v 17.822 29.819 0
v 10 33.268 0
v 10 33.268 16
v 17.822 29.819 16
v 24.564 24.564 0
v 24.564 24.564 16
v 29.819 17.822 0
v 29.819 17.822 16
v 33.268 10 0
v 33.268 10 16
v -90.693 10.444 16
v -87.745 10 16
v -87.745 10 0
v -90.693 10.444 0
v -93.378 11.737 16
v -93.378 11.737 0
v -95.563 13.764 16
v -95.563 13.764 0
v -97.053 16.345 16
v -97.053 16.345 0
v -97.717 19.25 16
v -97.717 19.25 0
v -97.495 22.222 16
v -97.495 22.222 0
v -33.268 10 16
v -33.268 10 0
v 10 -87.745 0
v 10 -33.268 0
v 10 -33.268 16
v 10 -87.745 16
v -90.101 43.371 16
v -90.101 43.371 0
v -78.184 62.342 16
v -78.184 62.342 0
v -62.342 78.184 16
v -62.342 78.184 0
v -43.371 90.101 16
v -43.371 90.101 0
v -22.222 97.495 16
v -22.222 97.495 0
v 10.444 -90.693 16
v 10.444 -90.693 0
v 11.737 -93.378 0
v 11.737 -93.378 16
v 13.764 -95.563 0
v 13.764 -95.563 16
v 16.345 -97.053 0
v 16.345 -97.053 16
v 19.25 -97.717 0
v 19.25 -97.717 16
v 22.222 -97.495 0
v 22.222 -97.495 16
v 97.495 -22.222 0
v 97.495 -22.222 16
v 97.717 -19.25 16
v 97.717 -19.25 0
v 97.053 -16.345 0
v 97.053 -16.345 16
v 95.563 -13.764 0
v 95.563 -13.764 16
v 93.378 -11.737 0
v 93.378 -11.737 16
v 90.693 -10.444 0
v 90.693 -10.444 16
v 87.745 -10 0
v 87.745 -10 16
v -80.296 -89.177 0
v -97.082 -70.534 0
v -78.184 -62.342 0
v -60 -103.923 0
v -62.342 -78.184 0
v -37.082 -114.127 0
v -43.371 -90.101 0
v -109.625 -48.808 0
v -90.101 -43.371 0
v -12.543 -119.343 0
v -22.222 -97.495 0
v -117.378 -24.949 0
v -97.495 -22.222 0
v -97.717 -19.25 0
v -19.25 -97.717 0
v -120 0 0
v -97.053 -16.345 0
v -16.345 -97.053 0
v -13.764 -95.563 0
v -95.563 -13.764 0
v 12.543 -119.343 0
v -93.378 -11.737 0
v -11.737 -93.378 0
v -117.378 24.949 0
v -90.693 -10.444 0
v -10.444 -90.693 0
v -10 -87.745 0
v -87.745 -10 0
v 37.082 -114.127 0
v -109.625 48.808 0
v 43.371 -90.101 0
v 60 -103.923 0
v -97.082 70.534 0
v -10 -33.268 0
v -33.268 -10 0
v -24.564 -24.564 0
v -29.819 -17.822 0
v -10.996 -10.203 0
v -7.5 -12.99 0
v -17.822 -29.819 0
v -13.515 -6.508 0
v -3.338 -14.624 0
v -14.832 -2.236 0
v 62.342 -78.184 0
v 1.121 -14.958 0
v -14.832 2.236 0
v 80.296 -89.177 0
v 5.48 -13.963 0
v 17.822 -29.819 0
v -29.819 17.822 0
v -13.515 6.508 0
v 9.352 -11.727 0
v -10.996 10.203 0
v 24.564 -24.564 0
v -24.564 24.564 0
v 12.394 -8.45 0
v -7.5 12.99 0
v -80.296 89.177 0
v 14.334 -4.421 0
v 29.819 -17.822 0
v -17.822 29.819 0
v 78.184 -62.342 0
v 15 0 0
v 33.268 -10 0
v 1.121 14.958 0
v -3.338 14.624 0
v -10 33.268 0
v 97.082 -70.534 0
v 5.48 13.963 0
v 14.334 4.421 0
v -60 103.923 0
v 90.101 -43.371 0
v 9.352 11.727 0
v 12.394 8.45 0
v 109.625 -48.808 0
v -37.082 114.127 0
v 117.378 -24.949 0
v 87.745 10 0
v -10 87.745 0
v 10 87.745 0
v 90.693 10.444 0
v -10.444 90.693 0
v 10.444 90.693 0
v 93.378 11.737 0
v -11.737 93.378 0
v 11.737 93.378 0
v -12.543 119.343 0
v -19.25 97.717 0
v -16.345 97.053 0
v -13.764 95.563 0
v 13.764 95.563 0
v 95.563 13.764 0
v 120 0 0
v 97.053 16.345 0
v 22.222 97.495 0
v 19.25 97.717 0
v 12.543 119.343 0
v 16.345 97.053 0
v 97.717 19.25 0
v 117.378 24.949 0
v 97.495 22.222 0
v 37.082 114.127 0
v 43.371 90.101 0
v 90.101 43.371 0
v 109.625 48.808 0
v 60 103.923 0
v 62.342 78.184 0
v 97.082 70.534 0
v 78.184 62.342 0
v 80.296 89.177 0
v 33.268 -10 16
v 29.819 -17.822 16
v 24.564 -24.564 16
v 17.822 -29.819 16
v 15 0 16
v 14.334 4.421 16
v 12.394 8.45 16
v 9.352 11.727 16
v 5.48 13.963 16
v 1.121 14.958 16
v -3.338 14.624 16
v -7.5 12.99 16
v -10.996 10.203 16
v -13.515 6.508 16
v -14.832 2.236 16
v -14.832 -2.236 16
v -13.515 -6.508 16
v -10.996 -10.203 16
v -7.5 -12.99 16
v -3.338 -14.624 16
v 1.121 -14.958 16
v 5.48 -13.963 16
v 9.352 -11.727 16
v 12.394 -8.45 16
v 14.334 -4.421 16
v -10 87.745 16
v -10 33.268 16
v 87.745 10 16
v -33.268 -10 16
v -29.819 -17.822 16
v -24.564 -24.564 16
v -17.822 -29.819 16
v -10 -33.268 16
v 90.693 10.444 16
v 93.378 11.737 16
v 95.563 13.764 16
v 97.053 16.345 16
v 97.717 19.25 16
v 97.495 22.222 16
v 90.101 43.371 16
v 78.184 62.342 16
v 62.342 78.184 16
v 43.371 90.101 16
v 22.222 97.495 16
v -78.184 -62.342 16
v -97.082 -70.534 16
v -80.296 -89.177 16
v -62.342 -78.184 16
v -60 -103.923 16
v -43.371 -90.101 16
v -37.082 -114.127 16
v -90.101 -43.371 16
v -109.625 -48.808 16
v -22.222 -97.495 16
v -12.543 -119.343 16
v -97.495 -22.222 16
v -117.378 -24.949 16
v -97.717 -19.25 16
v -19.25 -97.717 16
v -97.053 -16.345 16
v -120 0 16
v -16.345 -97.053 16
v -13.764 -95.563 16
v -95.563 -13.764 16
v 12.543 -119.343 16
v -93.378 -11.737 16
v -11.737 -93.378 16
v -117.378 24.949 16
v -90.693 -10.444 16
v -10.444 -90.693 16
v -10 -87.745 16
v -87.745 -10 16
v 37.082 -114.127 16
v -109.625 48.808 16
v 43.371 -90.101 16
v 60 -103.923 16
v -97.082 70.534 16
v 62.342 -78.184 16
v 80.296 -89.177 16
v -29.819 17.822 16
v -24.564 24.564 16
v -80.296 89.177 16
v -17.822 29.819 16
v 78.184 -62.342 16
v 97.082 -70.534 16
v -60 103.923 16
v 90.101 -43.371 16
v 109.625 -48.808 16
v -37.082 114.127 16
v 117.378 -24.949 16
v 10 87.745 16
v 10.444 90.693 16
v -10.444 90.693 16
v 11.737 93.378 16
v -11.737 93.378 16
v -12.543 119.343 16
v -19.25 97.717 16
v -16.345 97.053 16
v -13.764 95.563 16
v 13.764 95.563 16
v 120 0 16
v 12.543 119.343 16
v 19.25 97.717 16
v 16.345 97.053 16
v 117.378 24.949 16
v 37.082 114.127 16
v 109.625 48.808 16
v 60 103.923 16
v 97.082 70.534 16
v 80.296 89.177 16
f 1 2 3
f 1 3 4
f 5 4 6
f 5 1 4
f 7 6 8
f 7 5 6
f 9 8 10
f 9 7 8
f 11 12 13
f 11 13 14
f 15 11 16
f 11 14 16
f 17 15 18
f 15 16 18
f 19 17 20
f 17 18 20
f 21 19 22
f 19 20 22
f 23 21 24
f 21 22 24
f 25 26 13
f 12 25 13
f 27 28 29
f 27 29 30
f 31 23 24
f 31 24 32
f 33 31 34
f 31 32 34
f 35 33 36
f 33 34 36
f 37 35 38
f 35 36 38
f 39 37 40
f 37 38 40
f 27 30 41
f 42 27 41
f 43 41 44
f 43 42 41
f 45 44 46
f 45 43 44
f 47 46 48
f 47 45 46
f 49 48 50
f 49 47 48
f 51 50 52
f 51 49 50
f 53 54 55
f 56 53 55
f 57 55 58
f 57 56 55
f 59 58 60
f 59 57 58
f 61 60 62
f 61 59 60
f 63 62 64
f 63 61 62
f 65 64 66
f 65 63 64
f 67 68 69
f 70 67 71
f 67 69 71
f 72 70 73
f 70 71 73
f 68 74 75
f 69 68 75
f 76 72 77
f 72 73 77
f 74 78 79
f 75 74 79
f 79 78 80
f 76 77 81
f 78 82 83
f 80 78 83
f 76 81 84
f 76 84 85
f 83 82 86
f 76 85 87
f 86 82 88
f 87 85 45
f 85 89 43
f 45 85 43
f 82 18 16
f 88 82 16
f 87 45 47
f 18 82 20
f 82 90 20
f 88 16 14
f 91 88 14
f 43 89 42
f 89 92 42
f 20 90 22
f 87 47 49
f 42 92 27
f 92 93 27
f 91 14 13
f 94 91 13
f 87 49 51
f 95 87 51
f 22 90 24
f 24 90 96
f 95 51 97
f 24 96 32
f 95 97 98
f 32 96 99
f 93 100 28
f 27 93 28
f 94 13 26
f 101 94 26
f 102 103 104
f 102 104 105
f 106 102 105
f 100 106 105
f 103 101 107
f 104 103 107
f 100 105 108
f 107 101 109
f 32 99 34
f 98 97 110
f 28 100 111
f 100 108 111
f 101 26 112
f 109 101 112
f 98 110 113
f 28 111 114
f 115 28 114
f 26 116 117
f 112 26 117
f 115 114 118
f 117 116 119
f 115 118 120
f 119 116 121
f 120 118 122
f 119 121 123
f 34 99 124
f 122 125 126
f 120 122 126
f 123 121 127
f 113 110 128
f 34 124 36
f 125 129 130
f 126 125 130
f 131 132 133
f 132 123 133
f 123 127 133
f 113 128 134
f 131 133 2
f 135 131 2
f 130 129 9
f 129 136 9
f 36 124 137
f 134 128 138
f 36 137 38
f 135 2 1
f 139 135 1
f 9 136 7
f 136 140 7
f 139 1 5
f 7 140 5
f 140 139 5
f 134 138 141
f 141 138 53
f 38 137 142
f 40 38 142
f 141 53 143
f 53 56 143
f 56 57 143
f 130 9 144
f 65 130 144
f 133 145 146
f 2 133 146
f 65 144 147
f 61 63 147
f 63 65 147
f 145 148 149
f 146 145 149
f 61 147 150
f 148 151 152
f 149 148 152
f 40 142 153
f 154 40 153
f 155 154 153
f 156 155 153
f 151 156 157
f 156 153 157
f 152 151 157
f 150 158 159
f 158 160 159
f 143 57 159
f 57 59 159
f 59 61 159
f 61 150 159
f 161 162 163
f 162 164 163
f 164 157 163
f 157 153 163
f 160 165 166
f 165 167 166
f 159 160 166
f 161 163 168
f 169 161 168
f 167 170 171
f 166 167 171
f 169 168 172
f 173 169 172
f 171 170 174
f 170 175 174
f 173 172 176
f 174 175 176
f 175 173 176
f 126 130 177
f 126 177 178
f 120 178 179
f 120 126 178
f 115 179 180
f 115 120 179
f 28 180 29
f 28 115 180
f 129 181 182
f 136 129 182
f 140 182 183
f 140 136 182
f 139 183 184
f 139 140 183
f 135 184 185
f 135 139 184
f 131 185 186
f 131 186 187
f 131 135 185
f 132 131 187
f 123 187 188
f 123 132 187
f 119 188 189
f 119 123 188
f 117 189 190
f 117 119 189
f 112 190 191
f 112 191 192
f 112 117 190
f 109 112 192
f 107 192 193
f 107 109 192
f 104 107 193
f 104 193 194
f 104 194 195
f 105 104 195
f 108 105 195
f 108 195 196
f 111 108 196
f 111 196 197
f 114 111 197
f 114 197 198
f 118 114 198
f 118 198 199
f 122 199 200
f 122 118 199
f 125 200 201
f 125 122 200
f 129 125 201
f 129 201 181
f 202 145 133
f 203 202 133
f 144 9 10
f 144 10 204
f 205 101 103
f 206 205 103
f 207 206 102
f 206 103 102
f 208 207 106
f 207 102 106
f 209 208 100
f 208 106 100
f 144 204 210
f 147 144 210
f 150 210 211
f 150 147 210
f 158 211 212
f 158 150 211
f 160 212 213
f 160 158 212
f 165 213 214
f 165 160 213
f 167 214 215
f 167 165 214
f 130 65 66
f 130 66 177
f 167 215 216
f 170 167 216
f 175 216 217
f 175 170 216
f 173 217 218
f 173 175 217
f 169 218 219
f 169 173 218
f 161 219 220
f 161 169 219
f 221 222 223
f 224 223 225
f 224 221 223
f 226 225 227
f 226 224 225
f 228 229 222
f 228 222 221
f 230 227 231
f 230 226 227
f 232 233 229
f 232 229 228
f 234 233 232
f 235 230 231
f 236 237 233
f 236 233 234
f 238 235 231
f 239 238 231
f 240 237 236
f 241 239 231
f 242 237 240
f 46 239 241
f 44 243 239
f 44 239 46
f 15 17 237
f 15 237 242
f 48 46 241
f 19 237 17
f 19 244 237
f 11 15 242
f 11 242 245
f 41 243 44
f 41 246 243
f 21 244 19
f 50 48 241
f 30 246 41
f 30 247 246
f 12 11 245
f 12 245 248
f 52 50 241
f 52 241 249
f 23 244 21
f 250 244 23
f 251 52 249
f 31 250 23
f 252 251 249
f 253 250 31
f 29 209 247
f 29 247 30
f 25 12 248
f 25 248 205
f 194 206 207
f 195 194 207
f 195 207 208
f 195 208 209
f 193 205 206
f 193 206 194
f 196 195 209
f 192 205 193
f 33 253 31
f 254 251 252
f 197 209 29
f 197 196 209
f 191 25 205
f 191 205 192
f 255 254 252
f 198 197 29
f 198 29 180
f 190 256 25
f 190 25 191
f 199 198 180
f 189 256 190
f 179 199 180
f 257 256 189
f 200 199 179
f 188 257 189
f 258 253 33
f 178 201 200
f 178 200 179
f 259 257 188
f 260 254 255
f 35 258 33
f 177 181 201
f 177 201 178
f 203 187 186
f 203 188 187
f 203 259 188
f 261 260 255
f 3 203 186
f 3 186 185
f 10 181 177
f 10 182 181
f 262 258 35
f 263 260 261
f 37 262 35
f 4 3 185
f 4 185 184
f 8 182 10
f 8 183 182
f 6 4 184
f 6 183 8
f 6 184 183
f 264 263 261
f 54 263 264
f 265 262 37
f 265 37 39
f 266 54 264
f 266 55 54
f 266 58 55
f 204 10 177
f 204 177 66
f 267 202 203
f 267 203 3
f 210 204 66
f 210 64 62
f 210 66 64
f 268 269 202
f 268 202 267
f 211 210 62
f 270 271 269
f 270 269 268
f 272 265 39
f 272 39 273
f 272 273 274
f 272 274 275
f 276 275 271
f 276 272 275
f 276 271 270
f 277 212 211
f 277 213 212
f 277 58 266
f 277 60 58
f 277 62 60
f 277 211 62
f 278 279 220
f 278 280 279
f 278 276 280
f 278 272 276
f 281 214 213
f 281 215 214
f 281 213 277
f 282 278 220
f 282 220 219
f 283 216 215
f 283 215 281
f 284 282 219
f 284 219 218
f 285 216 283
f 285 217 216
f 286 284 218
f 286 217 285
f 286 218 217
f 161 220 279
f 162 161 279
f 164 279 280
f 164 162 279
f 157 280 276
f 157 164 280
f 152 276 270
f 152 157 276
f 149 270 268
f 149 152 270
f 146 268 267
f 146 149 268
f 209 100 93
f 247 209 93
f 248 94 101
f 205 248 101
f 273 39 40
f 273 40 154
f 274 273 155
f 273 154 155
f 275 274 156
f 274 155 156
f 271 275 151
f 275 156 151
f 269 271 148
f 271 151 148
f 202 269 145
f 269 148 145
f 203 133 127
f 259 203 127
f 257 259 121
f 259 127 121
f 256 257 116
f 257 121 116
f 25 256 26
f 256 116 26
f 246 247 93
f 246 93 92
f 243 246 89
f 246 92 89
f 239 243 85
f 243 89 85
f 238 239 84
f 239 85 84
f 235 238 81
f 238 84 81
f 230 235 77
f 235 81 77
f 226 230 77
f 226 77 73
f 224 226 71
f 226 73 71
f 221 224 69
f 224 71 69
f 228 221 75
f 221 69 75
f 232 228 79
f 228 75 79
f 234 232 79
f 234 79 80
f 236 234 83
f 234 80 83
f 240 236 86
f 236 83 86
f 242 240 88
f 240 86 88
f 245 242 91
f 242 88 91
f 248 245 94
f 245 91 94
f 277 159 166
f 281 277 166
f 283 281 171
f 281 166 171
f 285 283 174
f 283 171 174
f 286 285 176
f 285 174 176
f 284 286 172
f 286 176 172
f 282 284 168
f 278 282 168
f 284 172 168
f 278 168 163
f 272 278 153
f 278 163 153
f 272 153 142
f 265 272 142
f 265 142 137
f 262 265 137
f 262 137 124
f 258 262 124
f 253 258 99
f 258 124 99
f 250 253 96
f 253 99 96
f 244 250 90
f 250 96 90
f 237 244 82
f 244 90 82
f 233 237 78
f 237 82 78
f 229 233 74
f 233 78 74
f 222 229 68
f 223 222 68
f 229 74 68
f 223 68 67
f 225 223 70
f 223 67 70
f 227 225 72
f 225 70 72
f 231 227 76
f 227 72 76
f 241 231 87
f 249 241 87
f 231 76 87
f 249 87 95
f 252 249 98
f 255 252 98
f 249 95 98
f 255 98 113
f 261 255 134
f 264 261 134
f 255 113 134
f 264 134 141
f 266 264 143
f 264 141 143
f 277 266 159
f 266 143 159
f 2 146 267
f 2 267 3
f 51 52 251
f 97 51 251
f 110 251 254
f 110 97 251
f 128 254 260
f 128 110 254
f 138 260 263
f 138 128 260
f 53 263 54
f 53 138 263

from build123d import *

# Parameters (mm, degrees)
SKETCH1_R           = 120
SKETCH1_R_2         = 15
BOSS_EXTRUDE3_DEPTH = 16


with BuildPart() as part:
    # Sketch1 → Boss-Extrude3 (new body)
    with BuildSketch(Plane.XY):
        Circle(SKETCH1_R)
        Circle(SKETCH1_R_2, mode=Mode.SUBTRACT)
        with BuildLine():
            Line((10, 87.745437009), (10, 33.268151895))
            ThreePointArc((10, 33.268151895), (24.563895563, 24.563895563), (33.268151895, 10))
            Line((33.268151895, 10), (87.745437009, 10))
            ThreePointArc((87.745437009, 10), (95.562828998, 13.763944958), (97.495374355, 22.222323503))
            ThreePointArc((97.495374355, 22.222323503), (70.707777798, 70.707777798), (22.222323503, 97.495374355))
            ThreePointArc((22.222323503, 97.495374355), (13.763944958, 95.562828998), (10, 87.745437009))
        make_face(mode=Mode.SUBTRACT)
        with BuildLine():
            Line((-10, 87.745437009), (-10, 33.268151895))
            ThreePointArc((-10, 33.268151895), (-24.563895563, 24.563895563), (-33.268151895, 10))
            Line((-33.268151895, 10), (-87.745437009, 10))
            ThreePointArc((-87.745437009, 10), (-95.562828998, 13.763944958), (-97.495374355, 22.222323503))
            ThreePointArc((-97.495374355, 22.222323503), (-70.707777798, 70.707777798), (-22.222323503, 97.495374355))
            ThreePointArc((-22.222323503, 97.495374355), (-13.763944958, 95.562828998), (-10, 87.745437009))
        make_face(mode=Mode.SUBTRACT)
        with BuildLine():
            Line((-10, -33.268151895), (-10, -87.745437009))
            ThreePointArc((-10, -87.745437009), (-13.763944958, -95.562828998), (-22.222323503, -97.495374355))
            ThreePointArc((-22.222323503, -97.495374355), (-70.707777798, -70.707777798), (-97.495374355, -22.222323503))
            ThreePointArc((-97.495374355, -22.222323503), (-95.562828998, -13.763944958), (-87.745437009, -10))
            Line((-87.745437009, -10), (-33.268151895, -10))
            ThreePointArc((-33.268151895, -10), (-24.563895563, -24.563895563), (-10, -33.268151895))
        make_face(mode=Mode.SUBTRACT)
        with BuildLine():
            Line((10, -33.268151895), (10, -87.745437009))
            ThreePointArc((10, -87.745437009), (13.763944958, -95.562828998), (22.222323503, -97.495374355))
            ThreePointArc((22.222323503, -97.495374355), (70.707777798, -70.707777798), (97.495374355, -22.222323503))
            ThreePointArc((97.495374355, -22.222323503), (95.562828998, -13.763944958), (87.745437009, -10))
            Line((87.745437009, -10), (33.268151895, -10))
            ThreePointArc((33.268151895, -10), (24.563895563, -24.563895563), (10, -33.268151895))
        make_face(mode=Mode.SUBTRACT)
    extrude(amount=BOSS_EXTRUDE3_DEPTH)


solid = part.part
